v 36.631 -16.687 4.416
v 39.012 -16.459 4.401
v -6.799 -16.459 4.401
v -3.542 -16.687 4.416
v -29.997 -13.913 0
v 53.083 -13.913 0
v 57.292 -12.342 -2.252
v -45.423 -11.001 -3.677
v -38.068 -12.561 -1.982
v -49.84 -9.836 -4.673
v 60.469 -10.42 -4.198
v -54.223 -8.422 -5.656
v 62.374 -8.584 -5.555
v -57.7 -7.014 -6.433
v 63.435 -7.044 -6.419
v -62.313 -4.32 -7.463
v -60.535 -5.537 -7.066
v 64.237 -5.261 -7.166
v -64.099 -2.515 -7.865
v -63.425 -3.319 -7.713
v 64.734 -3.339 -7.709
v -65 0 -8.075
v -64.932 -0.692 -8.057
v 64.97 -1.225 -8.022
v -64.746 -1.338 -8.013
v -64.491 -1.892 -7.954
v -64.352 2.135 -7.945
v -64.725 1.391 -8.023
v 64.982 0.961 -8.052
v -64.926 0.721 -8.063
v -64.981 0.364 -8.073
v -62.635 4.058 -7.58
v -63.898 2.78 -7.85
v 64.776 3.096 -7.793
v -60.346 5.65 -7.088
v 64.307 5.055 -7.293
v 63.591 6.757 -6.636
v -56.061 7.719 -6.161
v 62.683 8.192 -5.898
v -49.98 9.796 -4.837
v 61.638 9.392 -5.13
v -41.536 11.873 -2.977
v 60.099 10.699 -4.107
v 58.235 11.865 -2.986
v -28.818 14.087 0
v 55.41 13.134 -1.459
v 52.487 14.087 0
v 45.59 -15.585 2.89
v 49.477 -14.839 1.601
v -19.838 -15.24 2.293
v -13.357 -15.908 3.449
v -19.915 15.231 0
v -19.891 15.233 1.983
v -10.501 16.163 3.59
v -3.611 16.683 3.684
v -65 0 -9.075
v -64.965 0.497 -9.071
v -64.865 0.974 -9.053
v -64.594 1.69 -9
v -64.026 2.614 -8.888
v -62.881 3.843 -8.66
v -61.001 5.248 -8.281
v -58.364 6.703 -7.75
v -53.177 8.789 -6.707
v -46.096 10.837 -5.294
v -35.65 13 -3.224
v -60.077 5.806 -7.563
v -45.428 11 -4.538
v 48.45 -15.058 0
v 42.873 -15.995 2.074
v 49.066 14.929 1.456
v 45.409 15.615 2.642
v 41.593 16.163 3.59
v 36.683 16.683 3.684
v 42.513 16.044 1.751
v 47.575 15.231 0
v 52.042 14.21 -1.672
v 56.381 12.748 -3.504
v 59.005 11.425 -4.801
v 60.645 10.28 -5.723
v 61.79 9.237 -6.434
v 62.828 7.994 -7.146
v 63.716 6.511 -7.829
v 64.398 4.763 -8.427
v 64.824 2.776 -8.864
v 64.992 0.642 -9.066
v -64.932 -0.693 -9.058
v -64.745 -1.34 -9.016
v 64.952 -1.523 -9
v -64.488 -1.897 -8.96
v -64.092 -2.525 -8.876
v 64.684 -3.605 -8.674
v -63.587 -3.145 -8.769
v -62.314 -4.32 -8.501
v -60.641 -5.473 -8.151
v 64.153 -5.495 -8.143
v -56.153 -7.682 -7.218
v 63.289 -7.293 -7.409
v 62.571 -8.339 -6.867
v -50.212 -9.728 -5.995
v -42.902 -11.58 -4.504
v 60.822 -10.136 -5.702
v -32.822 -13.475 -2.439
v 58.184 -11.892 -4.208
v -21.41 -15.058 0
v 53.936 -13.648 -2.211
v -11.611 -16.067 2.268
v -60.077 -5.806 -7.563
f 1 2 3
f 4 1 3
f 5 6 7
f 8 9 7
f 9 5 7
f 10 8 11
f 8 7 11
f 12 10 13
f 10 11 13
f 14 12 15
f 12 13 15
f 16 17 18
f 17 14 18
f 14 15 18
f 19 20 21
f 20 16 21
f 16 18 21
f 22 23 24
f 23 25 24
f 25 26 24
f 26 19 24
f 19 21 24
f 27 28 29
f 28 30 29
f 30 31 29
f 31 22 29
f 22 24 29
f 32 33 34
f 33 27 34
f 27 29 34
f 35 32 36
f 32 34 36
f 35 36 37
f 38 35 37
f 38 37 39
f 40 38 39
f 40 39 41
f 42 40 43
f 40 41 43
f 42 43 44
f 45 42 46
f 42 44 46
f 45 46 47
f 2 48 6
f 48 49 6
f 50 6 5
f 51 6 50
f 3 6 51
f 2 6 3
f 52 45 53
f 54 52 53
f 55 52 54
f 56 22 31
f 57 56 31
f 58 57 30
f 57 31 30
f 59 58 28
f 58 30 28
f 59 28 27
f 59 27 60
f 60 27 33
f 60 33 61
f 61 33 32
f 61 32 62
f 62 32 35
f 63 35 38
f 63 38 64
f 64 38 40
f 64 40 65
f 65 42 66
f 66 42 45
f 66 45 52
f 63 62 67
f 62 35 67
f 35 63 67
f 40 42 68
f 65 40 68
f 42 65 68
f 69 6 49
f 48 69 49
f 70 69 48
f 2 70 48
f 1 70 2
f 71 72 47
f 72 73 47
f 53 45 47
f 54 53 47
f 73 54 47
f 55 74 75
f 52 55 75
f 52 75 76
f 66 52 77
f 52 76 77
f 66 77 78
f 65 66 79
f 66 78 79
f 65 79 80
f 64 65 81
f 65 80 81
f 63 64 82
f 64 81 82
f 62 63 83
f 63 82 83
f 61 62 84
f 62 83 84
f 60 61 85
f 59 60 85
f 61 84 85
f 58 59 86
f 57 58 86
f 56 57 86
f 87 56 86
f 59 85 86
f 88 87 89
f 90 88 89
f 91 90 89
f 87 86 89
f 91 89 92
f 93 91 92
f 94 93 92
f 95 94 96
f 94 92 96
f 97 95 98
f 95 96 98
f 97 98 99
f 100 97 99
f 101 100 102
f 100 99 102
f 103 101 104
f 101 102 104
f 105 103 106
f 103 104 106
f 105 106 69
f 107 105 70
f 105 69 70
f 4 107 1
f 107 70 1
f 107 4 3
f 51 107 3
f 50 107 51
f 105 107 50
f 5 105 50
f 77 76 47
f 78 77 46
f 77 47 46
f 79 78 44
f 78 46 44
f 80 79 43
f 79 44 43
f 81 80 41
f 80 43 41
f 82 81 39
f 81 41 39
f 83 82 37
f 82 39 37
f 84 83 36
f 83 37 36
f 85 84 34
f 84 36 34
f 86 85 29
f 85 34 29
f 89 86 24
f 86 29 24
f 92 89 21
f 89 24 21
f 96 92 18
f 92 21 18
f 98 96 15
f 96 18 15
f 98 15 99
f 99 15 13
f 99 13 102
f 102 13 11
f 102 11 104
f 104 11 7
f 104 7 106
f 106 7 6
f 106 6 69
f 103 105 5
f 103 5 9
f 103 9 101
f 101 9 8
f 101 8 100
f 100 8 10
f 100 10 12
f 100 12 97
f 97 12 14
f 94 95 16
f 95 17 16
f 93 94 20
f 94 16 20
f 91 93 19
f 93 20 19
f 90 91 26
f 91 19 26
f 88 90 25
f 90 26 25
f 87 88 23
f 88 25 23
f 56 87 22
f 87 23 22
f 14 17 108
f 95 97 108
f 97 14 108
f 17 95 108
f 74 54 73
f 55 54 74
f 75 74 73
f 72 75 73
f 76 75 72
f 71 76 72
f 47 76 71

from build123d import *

# Parameters (mm, degrees)
F1_DEPTH = 10
F3_DEPTH = 100
F5_DEPTH = 100


with BuildPart() as f1:
    # F0 (on Top) → F1 (new body, symmetric)
    with BuildSketch(Plane.XY):
        with BuildLine():
            add(Edge.make_bspline(
                [(-65, 0), (-65, 3.9384197578), (-44.2964541725, 16.2873728277), (60.6156752763, 21.7459423145), (66.2097359245, 0), (60.6156752763, -21.7459423145), (-44.2964541725, -16.2873728277), (-65, -3.9384197578), (-65, 0)],
                knots=[0, 0, 0, 0, 0.1266051902, 0.396971793, 0.5, 0.603028207, 0.8733948098, 1, 1, 1, 1], degree=3))
        make_face()
    extrude(amount=F1_DEPTH, both=True)

    # F2 (on Right) → F3 (cut, symmetric)
    with BuildSketch(Plane.YZ):
        with BuildLine():
            Line((-16.4592039081, 4.401382496), (-13.9133739891, 0))
            ThreePointArc((-13.9133739891, 0), (0.0866260109, -8.075449035), (14.0866260109, 0))
            Line((14.0866260109, 0), (16.1633553569, 3.5903734669))
            Line((16.1633553569, 3.5903734669), (19.0447389302, 4.1077080864))
            Line((19.0447389302, 4.1077080864), (19.0447389302, 11.0051862262))
            Line((19.0447389302, 11.0051862262), (-19.27458619, 11.0051862262))
            Line((-19.27458619, 11.0051862262), (-19.27458619, 4.5866994551))
            Line((-19.27458619, 4.5866994551), (-16.4592039081, 4.401382496))
        make_face()
    extrude(amount=F3_DEPTH, both=True, mode=Mode.SUBTRACT)

    # F4 (on Right) → F5 (cut, symmetric)
    with BuildSketch(Plane.YZ):
        with BuildLine():
            ThreePointArc((17.1266555259, 5.9627156688), (-0.4915957656, -9.0657119499), (-17.0584643799, 7.1143770355))
            Line((-17.0584643799, 7.1143770355), (-23.8942094147, -11.3926613703))
            Line((-23.8942094147, -11.3926613703), (20.4203258146, -11.3926613703))
            Line((20.4203258146, -11.3926613703), (17.1266555259, 5.9627156688))
        make_face()
    extrude(amount=F5_DEPTH, both=True, mode=Mode.SUBTRACT)


solid = f1.part
